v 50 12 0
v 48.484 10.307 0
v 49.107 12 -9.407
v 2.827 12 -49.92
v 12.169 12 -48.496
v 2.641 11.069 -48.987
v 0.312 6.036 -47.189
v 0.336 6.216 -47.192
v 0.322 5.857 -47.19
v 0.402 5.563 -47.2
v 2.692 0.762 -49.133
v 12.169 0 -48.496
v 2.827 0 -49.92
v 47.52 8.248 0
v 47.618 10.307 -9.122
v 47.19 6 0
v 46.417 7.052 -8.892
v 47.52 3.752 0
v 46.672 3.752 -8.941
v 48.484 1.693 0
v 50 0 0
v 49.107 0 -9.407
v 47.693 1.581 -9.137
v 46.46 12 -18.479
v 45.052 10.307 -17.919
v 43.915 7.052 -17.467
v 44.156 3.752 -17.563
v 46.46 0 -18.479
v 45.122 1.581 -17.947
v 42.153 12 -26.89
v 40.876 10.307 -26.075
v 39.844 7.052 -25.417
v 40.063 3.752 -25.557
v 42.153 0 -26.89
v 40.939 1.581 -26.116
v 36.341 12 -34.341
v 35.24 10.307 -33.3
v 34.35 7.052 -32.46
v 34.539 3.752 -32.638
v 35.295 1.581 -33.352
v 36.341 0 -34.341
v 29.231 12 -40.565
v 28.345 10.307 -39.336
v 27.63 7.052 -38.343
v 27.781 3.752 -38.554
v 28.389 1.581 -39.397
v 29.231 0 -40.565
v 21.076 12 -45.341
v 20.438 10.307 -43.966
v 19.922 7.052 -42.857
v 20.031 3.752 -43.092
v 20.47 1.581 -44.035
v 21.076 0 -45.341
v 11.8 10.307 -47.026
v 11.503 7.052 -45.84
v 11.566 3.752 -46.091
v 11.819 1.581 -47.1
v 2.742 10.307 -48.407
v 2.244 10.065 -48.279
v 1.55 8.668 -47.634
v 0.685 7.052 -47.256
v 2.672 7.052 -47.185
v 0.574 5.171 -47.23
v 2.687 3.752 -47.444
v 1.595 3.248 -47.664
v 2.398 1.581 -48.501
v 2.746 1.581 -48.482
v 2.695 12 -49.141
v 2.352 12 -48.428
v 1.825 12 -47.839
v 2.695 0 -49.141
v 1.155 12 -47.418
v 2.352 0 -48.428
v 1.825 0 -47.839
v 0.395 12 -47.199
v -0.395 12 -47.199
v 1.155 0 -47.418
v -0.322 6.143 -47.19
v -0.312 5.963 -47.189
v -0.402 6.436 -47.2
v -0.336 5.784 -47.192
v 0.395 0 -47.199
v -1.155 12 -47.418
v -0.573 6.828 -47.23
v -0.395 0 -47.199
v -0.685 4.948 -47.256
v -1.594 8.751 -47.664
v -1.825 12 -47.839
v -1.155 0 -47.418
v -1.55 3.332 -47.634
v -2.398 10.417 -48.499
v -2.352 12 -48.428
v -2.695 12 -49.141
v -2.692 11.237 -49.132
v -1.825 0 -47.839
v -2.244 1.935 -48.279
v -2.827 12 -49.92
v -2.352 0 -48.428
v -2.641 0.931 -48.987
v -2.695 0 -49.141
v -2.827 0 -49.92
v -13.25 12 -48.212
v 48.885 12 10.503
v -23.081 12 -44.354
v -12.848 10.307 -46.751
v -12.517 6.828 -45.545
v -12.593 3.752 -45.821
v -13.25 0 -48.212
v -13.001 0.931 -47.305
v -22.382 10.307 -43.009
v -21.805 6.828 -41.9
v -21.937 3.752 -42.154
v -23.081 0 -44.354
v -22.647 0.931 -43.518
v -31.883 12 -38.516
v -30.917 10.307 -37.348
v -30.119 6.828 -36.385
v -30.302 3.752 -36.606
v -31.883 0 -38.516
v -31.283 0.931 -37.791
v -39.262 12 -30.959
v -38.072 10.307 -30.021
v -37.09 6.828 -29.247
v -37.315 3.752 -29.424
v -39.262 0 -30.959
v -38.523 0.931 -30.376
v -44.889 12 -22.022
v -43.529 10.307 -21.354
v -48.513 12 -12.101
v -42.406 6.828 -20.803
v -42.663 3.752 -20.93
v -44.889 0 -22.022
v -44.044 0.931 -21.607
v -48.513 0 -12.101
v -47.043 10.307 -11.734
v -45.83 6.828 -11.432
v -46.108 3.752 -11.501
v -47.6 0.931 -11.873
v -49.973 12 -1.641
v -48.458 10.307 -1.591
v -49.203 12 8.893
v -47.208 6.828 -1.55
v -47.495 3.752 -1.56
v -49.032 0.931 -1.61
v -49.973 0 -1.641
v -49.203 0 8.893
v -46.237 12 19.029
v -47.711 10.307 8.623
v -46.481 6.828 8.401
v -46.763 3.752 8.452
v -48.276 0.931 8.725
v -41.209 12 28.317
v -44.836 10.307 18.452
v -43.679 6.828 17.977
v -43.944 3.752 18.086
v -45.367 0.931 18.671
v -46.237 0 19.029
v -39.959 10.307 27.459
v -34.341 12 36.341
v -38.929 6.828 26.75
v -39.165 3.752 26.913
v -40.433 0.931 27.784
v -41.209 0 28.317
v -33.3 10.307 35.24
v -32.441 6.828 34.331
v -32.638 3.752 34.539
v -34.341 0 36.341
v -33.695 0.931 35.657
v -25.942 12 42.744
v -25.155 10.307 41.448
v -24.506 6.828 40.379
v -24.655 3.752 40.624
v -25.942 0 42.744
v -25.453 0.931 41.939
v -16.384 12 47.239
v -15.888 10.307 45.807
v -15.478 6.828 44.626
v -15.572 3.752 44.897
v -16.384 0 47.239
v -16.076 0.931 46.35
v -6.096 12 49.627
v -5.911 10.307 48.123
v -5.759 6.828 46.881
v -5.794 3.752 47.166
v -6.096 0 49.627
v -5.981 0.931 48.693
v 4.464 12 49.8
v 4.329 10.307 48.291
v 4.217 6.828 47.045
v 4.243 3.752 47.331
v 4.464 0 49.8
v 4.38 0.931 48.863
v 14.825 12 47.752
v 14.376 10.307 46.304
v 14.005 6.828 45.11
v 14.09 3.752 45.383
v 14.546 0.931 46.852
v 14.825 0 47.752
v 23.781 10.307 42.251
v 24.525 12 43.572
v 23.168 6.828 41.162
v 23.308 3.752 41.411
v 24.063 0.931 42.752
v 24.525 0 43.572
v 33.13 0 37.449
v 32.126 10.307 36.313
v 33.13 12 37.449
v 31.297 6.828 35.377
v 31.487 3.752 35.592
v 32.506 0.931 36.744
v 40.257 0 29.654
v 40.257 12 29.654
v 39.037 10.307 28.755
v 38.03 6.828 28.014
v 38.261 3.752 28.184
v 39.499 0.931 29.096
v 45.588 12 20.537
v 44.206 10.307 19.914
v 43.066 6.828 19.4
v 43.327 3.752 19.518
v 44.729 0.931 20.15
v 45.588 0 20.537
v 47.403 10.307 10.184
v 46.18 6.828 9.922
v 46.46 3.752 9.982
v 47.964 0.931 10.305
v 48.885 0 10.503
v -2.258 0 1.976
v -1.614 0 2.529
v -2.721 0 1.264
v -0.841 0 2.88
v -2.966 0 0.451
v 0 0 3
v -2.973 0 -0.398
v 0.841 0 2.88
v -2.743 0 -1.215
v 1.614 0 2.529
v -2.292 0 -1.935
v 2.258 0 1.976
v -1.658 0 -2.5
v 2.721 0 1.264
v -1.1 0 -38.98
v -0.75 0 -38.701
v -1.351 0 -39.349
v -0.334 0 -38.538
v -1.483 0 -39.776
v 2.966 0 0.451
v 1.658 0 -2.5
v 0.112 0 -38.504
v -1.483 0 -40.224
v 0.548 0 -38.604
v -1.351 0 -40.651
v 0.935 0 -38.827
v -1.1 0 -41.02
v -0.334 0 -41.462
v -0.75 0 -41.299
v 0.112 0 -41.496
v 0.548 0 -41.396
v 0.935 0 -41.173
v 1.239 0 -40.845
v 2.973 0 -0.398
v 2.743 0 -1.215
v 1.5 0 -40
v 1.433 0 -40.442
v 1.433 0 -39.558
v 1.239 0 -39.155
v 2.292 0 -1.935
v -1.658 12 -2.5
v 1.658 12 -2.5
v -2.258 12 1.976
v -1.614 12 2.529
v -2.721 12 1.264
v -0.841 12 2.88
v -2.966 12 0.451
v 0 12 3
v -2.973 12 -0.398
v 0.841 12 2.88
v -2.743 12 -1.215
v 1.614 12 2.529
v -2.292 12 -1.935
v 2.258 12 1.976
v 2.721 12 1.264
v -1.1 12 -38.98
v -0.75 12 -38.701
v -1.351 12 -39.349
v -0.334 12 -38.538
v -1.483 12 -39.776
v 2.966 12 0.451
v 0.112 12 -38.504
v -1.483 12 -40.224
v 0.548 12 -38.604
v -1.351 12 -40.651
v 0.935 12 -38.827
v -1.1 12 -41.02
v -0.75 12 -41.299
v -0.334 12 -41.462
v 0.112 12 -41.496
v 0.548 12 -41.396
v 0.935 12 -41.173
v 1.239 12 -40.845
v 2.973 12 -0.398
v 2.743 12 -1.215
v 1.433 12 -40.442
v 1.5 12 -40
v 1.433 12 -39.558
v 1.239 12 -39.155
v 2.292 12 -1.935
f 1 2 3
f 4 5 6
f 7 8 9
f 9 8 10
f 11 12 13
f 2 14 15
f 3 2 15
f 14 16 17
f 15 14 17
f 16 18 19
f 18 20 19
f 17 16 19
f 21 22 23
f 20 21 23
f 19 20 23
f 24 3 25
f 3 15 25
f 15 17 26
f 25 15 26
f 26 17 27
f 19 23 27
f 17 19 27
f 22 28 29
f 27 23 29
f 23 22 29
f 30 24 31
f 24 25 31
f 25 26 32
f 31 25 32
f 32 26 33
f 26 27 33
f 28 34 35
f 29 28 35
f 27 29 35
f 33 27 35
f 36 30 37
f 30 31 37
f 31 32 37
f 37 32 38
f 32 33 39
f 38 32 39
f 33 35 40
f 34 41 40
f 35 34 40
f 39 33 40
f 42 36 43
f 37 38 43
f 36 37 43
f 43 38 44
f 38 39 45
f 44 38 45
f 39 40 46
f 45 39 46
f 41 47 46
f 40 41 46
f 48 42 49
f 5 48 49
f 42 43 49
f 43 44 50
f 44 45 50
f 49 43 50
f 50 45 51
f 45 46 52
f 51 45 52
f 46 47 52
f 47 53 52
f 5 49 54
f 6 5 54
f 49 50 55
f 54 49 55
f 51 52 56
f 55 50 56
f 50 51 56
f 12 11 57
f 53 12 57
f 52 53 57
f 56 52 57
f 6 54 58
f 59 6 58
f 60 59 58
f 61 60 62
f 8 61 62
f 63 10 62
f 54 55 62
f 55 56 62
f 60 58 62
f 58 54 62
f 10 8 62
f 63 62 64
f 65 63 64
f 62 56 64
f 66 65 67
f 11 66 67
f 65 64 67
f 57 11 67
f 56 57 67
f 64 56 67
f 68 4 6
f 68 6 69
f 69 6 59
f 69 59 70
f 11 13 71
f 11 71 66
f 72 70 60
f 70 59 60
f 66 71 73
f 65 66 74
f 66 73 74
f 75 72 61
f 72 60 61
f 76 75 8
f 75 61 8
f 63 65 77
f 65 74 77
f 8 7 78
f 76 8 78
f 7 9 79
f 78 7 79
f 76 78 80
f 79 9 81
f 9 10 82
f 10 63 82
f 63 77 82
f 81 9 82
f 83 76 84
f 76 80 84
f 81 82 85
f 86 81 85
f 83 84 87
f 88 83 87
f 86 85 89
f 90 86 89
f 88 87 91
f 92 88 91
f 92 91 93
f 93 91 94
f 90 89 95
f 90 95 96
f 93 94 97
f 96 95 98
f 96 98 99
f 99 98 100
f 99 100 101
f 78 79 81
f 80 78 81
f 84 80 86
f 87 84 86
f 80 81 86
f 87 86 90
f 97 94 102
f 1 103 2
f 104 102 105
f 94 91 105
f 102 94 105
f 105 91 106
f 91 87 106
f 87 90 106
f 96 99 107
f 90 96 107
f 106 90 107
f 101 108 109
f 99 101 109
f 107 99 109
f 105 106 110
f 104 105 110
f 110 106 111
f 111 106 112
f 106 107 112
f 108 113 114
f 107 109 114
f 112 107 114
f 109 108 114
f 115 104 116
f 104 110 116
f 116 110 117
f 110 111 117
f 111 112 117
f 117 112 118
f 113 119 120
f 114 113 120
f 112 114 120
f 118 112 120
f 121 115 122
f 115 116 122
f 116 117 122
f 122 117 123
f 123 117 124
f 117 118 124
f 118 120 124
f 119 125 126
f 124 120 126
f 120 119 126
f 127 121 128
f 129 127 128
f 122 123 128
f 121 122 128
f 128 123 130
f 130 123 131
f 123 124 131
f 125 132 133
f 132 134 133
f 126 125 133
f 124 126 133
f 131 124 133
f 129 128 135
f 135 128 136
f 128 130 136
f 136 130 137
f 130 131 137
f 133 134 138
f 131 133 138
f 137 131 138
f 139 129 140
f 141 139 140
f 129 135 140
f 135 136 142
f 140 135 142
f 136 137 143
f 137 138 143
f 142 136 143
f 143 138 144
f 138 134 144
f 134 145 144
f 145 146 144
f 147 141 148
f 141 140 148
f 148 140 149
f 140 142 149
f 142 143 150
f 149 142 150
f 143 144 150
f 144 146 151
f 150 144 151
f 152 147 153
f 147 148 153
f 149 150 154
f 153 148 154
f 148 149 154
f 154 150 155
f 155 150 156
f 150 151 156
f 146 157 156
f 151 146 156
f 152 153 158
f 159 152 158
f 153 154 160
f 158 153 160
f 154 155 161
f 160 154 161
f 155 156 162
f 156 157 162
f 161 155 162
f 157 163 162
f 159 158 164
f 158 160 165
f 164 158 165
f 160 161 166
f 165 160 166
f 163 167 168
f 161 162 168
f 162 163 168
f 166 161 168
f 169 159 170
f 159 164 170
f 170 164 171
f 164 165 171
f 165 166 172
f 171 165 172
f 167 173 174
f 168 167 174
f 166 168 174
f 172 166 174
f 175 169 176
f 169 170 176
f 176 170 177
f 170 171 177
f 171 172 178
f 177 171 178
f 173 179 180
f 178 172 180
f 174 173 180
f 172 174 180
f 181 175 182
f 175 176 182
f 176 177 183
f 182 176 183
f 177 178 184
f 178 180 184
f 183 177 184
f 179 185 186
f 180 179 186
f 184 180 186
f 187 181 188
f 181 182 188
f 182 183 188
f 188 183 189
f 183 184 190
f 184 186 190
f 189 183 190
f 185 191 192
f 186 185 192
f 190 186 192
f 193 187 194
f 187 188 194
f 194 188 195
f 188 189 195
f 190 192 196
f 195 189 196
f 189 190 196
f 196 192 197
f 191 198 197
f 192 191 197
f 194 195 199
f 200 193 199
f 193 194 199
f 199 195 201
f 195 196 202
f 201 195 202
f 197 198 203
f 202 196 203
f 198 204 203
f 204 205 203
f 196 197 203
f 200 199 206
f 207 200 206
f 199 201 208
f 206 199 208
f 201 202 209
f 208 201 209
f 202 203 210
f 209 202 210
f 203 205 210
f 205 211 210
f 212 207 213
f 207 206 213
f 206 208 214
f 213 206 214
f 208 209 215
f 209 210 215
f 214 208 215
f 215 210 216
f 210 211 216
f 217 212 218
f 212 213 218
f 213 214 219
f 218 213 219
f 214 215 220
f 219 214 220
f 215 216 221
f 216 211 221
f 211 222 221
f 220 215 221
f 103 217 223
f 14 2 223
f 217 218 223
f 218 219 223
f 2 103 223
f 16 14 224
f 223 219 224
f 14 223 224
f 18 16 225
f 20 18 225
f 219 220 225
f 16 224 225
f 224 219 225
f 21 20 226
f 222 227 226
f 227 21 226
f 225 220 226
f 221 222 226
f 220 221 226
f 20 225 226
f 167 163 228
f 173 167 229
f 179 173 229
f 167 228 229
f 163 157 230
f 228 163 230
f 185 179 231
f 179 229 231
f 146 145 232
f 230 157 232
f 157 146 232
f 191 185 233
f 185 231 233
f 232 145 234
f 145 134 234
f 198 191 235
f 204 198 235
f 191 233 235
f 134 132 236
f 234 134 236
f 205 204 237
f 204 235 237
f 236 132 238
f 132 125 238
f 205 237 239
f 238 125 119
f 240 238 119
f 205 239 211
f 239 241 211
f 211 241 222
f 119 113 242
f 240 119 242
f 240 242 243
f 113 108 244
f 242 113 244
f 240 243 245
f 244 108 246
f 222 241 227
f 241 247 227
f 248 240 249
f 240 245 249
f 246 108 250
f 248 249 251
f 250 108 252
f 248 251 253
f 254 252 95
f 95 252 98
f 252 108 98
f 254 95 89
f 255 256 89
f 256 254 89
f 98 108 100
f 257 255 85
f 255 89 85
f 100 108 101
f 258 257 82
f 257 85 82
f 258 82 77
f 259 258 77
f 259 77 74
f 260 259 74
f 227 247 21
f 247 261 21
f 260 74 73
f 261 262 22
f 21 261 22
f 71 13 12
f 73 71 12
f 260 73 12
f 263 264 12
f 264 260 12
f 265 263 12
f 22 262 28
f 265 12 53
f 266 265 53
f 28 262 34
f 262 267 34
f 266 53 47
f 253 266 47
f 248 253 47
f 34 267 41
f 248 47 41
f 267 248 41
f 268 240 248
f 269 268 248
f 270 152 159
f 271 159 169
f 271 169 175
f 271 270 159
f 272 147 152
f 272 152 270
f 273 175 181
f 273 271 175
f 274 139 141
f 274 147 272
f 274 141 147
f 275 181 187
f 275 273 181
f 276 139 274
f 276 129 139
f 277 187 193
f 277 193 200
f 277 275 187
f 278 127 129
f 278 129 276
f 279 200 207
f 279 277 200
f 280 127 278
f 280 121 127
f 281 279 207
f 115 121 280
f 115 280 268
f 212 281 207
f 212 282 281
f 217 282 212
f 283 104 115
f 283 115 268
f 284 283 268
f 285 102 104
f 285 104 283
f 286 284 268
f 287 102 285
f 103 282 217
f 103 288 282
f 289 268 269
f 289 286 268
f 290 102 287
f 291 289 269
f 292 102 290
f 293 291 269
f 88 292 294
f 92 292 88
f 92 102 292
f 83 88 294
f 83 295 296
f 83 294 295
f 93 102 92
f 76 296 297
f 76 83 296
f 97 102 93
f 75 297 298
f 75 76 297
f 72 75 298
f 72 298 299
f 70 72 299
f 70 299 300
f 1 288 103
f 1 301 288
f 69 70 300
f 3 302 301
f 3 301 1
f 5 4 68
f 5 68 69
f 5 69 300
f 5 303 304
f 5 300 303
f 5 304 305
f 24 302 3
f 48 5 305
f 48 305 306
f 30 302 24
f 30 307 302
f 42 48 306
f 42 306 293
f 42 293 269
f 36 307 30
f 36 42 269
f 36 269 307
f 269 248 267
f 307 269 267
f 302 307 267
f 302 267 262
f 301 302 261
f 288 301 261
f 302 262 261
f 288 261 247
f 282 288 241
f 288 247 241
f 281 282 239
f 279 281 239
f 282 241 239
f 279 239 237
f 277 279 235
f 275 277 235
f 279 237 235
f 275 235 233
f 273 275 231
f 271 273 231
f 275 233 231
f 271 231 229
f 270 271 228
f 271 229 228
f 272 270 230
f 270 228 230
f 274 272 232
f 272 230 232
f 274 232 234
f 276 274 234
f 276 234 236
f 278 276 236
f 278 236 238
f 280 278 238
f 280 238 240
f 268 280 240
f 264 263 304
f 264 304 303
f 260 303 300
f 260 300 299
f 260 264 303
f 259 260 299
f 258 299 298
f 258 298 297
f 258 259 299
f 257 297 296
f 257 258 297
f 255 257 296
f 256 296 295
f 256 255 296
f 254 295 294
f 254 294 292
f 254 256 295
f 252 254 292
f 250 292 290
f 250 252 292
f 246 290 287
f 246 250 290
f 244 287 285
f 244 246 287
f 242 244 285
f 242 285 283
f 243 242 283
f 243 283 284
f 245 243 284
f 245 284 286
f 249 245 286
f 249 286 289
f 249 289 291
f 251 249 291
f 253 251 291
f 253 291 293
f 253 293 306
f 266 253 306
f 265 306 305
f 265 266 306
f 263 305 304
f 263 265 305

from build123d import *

# Parameters (mm, degrees)
SKETCH2_R           = 1.5
BOSS_EXTRUDE3_DEPTH = 12
SKETCH4_R           = 7.810249676


with BuildPart() as part:
    # Sketch2 → Boss-Extrude3 (new body)
    with BuildSketch(Plane(origin=(0, 0, 0), x_dir=(1, 0, 0), z_dir=(0, 1, 0))):
        with BuildLine():
            ThreePointArc((2.827295528, 49.92), (0, 47.171572875), (-2.827295528, 49.92))
            ThreePointArc((-2.827295528, 49.92), (0, -50), (2.827295528, 49.92))
        make_face()
        with BuildLine():
            ThreePointArc((1.658312395, 2.5), (0, -3), (-1.658312395, 2.5))
            Line((-1.658312395, 2.5), (1.658312395, 2.5))
        make_face(mode=Mode.SUBTRACT)
        with Locations((0, 40)):
            Circle(SKETCH2_R, mode=Mode.SUBTRACT)
    extrude(amount=BOSS_EXTRUDE3_DEPTH)

    # Sketch4 → Cut-Revolve1 (revolve, cut)
    with BuildSketch(Plane.XY):
        with Locations((55, 6)):
            Circle(SKETCH4_R)
    revolve(axis=Axis((0, 0, 0), (0, 1, 0)), mode=Mode.SUBTRACT)


solid = part.part
